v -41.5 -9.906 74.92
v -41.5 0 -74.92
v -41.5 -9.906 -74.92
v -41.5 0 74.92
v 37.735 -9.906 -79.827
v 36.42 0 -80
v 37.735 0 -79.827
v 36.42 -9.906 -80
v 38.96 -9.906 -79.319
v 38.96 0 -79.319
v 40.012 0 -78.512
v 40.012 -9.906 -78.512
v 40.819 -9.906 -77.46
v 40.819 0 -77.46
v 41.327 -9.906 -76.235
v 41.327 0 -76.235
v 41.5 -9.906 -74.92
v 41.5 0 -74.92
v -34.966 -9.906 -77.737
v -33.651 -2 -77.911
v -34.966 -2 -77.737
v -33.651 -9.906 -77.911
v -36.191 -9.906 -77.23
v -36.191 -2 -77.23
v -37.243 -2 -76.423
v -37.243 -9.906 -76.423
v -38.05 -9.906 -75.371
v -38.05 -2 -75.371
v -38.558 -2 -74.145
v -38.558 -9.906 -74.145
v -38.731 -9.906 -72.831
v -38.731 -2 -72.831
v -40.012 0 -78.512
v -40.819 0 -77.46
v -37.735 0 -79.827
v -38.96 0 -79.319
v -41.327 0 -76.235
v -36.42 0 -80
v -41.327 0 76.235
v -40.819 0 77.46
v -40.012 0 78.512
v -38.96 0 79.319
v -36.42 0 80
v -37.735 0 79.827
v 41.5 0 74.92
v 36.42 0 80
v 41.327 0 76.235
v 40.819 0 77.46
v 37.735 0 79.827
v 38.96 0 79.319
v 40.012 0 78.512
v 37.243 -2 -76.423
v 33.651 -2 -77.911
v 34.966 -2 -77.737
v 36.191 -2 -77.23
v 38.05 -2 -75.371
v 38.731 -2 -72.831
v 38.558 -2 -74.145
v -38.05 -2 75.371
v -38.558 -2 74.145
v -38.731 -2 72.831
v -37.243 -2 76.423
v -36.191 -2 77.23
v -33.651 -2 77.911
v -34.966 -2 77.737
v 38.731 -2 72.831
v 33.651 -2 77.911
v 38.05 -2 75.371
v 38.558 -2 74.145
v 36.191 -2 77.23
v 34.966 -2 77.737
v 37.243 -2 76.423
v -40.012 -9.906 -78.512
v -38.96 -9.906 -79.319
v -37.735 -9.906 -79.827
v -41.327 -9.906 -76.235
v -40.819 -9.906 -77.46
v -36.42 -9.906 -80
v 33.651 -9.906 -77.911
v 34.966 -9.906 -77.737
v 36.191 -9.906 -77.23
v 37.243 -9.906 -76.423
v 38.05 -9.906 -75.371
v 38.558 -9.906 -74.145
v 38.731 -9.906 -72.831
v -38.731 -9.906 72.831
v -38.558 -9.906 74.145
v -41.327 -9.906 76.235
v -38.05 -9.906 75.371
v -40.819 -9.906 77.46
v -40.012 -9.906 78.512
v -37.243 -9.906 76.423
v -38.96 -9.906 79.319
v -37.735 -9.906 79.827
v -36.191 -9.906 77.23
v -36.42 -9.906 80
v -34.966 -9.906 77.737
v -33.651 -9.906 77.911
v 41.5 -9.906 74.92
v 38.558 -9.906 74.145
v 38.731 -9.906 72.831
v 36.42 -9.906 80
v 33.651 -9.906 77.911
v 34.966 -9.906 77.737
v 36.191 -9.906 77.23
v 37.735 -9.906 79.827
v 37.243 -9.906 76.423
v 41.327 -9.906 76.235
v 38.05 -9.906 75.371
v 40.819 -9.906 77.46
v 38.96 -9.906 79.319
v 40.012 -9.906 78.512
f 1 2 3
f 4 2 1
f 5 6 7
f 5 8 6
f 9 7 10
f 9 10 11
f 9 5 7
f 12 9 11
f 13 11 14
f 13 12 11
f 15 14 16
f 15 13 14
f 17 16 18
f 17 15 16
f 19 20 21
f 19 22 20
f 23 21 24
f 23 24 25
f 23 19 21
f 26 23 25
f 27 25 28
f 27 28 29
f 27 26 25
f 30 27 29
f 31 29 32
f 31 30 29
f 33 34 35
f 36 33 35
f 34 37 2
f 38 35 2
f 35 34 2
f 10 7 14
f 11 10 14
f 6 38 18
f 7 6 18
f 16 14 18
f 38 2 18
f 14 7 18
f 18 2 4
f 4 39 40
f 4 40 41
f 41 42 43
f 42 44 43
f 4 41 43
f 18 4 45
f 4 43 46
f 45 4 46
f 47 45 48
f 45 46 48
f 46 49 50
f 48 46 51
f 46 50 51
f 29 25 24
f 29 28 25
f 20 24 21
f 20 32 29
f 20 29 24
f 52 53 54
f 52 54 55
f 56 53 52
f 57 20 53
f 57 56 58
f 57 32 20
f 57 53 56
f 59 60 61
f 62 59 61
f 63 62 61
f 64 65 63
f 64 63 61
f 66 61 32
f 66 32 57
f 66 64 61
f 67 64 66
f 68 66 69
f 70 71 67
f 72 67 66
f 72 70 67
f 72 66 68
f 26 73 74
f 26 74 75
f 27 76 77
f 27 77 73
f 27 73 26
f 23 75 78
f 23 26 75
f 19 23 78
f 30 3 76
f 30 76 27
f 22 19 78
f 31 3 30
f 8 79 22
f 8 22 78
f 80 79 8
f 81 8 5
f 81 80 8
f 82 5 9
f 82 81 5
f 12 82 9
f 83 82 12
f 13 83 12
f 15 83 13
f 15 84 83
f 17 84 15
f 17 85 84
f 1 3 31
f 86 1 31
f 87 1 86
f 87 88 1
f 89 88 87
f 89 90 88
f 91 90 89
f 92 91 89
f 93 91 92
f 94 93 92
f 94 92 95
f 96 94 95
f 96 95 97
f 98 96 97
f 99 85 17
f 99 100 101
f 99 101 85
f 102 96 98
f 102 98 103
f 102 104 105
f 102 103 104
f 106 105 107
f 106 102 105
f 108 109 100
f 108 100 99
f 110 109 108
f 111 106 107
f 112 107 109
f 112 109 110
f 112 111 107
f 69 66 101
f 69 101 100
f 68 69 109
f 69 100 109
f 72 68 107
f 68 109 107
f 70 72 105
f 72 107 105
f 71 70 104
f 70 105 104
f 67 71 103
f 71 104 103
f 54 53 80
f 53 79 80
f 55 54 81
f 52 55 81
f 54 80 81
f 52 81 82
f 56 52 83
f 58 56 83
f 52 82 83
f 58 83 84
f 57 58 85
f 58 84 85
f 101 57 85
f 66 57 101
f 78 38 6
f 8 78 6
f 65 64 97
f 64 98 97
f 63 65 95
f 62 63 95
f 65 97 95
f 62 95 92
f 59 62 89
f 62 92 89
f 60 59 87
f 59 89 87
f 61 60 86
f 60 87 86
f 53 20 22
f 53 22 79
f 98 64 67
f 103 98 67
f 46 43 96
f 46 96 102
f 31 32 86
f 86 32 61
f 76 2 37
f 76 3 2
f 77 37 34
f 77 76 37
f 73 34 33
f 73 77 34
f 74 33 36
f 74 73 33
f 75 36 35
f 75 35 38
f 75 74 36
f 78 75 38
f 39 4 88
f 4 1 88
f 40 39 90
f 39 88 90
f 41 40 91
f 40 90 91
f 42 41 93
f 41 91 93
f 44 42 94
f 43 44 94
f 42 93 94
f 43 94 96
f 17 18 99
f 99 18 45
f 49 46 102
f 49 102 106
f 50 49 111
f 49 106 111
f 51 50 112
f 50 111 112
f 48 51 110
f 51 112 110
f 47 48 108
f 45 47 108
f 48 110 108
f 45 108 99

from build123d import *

# Parameters (mm, degrees)
F0_W     = 83
F0_H     = 160
F0_W_2   = 77.461682
F0_H_2   = 155.82101
F1_DEPTH = 9.906
F2_DEPTH = 2
F3_R     = 5.08


with BuildPart() as f1:
    # F0 (on Front) → F1 (new body)
    with BuildSketch(Plane.XZ):
        Rectangle(F0_W, F0_H)
        Rectangle(F0_W_2, F0_H_2, mode=Mode.SUBTRACT)
    extrude(amount=F1_DEPTH)

    # F0 (on Front) → F2 (join)
    with BuildSketch(Plane.XZ):
        Rectangle(F0_W_2, F0_H_2)
    extrude(amount=F2_DEPTH)

    # F3
    f3_edges = [f1.edges().sort_by_distance(p)[0] for p in [
        (-38.730841, -5.953, 77.910505),
        (38.730841, -5.953, 77.910505),
        (-38.730841, -5.953, -77.910505),
        (38.730841, -5.953, -77.910505),
        (41.5, -4.953, -80),
        (-41.5, -4.953, 80),
        (-41.5, -4.953, -80),
        (41.5, -4.953, 80),
    ]]
    fillet(f3_edges, radius=F3_R)


solid = f1.part
